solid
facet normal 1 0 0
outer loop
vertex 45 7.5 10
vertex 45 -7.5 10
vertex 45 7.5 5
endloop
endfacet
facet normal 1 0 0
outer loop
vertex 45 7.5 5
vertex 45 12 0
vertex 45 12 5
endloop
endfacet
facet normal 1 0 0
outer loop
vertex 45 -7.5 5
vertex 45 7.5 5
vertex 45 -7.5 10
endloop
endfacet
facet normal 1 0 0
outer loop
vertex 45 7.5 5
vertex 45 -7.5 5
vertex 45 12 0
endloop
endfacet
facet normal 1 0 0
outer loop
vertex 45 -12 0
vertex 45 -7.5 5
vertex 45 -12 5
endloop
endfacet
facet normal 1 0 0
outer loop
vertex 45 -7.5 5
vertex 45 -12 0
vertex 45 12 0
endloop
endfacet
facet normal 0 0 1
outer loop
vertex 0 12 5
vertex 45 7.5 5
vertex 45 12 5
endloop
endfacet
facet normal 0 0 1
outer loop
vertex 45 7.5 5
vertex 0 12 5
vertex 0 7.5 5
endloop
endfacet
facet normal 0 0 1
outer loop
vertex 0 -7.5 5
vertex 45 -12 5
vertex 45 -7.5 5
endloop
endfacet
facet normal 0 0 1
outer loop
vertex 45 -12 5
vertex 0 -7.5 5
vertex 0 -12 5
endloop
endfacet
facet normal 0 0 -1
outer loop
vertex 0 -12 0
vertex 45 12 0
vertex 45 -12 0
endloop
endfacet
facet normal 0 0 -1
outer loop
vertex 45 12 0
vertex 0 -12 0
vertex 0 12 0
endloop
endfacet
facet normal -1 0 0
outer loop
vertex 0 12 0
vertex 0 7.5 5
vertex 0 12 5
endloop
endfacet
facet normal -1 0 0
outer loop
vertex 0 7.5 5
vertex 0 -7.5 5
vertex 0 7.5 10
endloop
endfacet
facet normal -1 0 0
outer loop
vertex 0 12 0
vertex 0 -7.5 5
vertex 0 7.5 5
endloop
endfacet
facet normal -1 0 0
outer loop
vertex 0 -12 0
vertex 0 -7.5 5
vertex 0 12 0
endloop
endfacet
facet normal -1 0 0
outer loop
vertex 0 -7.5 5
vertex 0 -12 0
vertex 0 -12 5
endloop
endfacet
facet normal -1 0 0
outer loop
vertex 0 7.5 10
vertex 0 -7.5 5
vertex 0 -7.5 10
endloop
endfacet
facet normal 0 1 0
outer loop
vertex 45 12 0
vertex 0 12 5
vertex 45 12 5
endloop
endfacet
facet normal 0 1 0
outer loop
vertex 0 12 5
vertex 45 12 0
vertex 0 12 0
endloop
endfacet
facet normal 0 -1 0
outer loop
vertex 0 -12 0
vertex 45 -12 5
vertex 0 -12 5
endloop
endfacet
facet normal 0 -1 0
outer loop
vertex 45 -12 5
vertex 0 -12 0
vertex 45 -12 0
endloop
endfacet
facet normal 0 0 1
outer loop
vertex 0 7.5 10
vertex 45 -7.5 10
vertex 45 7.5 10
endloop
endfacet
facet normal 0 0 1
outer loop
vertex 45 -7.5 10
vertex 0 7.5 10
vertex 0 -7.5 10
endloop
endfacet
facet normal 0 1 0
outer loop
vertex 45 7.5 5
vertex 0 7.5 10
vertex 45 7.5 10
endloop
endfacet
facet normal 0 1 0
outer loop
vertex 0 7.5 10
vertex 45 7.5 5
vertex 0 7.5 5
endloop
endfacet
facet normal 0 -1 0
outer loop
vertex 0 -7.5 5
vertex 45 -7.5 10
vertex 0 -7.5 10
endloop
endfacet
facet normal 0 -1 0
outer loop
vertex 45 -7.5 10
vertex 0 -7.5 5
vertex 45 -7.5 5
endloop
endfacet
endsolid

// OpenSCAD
// file: Library/center.scad
module center(axis){
	translate((axis / -2.0)){
		children();
	}
}
// file: CylinderDispenser_Dispenser_Virgin_Rail_Wall.scad
use <Library/center.scad>

//Length, width, height. Length is gonna be the rail length, which is the spring length plus the paddle thiccness.
dimensions = [50, 10, 5];
module CylinderDispenser_Dispenser_Virgin_Rail_Wall(dimensions){
	//The walls still "grow" forwards, but it's the parent module's job to translate/rotate/mirror it
	center([0, dimensions[1], 0]){
		cube(dimensions);
	}
}
CylinderDispenser_Rail_Wall(dimensions);
// file: CylinderDispenser_Dispenser_Virgin_Rail_Floor.scad
use <Library/center.scad>
//Length, width, height. The length is how long the rail is, starting at the center of the flue, going back.
dimensions = [50, 50, 5];
module CylinderDispenser_Dispenser_Virgin_Rail_Floor(dimensions){
	center([0, dimensions[1], 0]) cube(dimensions);
}
CylinderDispenser_Rail_Floor(dimensions);
// main file
use <CylinderDispenser_Dispenser_Virgin_Rail_Floor.scad>
use <CylinderDispenser_Dispenser_Virgin_Rail_Wall.scad>

//Rail should allow for any shape to be cut into it, so you could make an ejector that is star shaped if you want it to.
//Really this whole thing is just positive space waiting for other things to cut it, like the Flue and the Ejector.

//Length, width, height of the floor
floorDimensions = [45, 24, 5];
//Length, width, and height of the rail. Rail length should be the same as the floor length.
wallDimensions = [45, 15, 5];
/* [Rail] [Wall] */
//Get rail walls that stick up out of the floor to better help guide the ejector
railWall = true;

module CylinderDispenser_Dispenser_Virgin_Rail(floorDimensions, railWall, wallDimensions){
	union(){
		CylinderDispenser_Dispenser_Virgin_Rail_Floor(floorDimensions);
		if(railWall){
			translate([0, 0, floorDimensions.z])
			CylinderDispenser_Dispenser_Virgin_Rail_Wall(wallDimensions);
		}
	}
}

CylinderDispenser_Dispenser_Virgin_Rail(floorDimensions, railWall, wallDimensions);
